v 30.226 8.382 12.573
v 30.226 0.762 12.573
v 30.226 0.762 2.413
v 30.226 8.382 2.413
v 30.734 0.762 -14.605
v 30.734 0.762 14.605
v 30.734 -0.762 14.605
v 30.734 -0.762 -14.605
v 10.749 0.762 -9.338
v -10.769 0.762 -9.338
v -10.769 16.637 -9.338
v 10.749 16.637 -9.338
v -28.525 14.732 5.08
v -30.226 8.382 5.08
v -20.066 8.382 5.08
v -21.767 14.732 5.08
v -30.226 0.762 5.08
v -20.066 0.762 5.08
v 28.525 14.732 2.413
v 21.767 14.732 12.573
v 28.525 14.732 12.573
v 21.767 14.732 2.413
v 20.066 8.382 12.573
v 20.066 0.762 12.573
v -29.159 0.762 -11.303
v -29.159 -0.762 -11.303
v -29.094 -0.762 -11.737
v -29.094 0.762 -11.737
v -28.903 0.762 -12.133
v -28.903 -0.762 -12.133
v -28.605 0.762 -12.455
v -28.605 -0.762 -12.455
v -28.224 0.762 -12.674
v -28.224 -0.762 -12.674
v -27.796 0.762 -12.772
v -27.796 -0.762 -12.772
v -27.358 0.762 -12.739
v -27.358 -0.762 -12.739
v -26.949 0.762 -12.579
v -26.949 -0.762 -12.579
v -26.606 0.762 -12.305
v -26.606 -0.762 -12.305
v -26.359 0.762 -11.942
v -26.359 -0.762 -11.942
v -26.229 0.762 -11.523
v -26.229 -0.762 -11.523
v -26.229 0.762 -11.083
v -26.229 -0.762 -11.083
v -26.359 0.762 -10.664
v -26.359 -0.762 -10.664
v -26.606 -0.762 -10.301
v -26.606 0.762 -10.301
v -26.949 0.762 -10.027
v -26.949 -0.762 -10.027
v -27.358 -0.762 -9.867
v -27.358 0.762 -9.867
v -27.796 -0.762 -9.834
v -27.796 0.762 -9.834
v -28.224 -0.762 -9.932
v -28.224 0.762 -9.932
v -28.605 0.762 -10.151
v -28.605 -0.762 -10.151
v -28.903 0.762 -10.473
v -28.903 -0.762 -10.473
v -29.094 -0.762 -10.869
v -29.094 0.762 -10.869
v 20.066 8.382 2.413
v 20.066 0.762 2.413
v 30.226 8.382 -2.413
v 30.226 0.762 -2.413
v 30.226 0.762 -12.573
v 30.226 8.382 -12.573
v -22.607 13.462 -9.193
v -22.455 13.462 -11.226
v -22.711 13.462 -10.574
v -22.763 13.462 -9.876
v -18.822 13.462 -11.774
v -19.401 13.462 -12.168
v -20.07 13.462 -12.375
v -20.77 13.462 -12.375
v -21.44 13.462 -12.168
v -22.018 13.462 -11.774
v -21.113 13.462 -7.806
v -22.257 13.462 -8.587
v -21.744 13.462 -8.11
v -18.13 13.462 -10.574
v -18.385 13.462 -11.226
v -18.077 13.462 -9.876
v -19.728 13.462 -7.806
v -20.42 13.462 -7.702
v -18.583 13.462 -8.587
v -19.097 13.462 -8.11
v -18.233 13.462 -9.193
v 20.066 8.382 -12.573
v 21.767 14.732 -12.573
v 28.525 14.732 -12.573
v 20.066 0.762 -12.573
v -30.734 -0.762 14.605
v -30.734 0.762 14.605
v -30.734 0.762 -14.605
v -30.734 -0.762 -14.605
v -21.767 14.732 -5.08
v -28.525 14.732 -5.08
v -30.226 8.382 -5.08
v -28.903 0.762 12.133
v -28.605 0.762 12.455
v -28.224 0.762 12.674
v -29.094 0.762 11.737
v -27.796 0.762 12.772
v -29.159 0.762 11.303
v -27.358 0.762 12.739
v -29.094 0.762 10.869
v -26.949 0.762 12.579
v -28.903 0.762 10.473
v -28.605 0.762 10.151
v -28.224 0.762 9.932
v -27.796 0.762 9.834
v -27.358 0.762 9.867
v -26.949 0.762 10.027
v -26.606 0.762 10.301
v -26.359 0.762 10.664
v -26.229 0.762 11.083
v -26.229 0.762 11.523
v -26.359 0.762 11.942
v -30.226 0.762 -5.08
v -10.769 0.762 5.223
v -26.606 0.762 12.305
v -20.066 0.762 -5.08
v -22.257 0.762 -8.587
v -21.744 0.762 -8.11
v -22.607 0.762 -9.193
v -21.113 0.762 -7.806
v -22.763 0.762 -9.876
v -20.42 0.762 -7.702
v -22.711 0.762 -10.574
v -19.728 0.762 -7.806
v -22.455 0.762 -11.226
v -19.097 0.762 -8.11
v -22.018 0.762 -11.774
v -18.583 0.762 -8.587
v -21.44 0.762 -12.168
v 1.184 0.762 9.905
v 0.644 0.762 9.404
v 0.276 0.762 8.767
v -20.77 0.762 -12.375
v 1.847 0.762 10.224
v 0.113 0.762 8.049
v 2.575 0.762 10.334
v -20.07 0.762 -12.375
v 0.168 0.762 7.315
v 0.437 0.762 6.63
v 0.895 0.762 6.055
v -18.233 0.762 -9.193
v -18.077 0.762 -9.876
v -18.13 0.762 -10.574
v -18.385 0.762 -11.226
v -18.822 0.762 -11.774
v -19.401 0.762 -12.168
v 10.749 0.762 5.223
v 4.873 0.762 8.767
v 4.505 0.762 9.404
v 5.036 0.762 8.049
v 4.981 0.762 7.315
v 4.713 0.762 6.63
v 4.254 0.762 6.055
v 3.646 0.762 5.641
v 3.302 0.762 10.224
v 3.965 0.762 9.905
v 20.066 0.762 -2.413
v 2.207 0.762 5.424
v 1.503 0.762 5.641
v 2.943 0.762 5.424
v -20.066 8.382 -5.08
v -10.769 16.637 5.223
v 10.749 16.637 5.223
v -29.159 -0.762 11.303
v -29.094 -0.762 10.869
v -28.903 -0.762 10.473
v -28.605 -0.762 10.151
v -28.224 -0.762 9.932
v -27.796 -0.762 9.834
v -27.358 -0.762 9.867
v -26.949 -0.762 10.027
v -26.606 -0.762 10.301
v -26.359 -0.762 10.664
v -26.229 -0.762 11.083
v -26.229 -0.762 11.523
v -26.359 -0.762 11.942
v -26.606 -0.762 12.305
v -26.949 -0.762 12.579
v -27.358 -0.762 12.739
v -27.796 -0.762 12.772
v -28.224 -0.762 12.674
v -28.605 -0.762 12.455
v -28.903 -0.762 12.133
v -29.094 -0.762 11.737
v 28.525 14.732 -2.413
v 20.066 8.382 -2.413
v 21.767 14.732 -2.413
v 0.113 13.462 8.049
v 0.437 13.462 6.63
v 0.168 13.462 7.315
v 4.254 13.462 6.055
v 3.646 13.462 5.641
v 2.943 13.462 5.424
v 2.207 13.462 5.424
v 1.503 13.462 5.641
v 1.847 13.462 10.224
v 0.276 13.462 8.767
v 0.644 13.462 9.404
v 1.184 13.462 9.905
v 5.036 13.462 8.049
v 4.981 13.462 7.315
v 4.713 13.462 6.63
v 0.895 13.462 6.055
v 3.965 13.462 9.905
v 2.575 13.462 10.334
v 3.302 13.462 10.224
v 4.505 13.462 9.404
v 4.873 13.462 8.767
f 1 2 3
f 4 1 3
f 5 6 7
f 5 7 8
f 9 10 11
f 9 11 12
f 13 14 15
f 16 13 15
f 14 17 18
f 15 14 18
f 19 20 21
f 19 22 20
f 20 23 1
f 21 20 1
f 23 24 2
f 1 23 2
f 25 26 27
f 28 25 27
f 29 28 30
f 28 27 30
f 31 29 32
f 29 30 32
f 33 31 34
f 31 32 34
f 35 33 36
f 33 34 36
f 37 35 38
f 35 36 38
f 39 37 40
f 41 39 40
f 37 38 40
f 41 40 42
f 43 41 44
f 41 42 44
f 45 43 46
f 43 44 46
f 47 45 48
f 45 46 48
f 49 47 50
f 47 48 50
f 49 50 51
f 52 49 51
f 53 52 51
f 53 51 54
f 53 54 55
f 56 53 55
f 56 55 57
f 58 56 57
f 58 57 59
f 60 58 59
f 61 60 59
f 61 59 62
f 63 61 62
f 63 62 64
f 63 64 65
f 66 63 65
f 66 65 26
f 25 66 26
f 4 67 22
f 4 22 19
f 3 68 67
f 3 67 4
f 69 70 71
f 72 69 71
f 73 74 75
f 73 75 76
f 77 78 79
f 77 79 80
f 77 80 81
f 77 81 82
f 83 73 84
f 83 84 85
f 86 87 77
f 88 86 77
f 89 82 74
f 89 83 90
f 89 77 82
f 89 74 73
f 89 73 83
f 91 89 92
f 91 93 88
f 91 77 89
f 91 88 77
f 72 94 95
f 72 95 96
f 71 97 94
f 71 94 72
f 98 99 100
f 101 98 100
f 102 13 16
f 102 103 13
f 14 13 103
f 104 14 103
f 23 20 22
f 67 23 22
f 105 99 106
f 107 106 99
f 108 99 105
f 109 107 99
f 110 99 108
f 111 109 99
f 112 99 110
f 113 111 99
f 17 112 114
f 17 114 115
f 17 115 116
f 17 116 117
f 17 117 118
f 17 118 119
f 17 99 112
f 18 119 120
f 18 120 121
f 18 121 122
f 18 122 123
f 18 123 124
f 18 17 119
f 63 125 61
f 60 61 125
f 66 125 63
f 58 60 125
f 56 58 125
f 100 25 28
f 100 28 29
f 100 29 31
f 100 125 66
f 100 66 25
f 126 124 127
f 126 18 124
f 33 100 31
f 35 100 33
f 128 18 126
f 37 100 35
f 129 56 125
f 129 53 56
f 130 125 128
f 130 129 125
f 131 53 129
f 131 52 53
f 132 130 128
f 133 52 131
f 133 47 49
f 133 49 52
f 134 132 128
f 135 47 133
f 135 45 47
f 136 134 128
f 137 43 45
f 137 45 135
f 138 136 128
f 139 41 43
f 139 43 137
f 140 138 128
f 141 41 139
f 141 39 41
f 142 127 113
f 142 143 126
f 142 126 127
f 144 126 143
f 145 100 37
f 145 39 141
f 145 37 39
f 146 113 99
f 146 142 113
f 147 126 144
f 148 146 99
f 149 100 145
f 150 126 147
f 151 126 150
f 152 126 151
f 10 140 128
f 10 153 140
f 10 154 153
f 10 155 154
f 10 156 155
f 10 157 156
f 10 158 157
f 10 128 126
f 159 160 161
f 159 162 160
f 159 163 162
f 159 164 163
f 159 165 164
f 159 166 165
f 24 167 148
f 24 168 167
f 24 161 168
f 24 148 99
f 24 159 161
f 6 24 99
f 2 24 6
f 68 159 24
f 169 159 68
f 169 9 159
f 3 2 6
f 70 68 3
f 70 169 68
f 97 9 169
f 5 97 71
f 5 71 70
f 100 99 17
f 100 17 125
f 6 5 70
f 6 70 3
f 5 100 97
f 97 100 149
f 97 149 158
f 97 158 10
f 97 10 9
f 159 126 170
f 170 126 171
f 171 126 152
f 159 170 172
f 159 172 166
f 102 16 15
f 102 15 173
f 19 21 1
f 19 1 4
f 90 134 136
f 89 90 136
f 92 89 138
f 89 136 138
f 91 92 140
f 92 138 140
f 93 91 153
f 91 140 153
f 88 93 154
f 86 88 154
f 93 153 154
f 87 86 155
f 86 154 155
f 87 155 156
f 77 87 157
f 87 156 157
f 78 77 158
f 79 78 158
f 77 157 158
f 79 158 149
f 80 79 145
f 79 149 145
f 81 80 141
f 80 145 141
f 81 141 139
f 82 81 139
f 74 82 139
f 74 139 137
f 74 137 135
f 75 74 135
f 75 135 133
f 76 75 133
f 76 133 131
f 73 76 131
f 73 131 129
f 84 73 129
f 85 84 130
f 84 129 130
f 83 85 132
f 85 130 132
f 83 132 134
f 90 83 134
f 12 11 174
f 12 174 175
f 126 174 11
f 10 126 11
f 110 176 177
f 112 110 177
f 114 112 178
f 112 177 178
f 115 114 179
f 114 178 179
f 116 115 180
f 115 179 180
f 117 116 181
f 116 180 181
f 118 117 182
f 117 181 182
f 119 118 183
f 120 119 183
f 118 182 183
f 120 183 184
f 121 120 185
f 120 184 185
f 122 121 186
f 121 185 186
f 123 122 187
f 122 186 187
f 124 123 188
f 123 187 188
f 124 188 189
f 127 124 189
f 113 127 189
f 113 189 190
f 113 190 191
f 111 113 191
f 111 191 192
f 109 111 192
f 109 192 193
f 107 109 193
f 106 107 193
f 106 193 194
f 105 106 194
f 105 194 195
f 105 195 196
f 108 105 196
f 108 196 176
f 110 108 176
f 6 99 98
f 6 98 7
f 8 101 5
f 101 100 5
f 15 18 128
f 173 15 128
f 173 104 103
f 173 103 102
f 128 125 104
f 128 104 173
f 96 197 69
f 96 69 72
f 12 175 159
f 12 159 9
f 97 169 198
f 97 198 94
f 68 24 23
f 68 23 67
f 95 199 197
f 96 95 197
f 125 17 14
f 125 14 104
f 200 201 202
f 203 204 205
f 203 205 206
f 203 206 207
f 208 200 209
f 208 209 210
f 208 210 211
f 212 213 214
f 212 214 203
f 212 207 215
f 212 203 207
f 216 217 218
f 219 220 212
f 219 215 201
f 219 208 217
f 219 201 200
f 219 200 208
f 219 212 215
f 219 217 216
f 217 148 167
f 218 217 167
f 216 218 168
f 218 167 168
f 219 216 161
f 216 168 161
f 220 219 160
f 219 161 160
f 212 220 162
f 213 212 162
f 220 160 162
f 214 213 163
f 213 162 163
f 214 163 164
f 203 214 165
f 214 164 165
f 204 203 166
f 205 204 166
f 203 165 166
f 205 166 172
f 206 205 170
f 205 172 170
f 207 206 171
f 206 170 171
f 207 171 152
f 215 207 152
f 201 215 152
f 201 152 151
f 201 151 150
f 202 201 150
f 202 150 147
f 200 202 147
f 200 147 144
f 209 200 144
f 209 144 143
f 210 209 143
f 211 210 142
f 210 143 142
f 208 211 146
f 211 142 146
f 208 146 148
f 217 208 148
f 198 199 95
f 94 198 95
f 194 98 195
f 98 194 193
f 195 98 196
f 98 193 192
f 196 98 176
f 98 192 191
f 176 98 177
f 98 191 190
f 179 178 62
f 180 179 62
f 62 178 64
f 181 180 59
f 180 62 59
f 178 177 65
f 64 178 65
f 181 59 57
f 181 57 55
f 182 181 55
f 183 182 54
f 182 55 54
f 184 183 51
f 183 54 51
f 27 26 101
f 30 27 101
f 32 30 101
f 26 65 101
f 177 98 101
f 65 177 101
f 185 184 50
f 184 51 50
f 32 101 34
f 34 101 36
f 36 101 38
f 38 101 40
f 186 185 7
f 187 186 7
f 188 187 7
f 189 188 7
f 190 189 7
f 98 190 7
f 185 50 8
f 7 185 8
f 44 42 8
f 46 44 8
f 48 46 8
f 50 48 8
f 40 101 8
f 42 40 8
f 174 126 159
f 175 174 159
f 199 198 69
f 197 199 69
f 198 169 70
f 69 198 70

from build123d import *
from OCP.BRepFilletAPI import BRepFilletAPI_MakeChamfer

# Parameters (mm, degrees)
SKETCH1_W                   = 61.468
SKETCH1_H                   = 29.21
BOSS_EXTRUDE1_DEPTH         = 0.762
F_32_0_116_DIAMETER_HOLE1_D = 2.9464
SKETCH4_W                   = 10.16
SKETCH4_H                   = 10.16
BOSS_EXTRUDE2_DEPTH         = 13.97
SKETCH5_W                   = 10.16
SKETCH5_H                   = 10.16
BOSS_EXTRUDE3_DEPTH         = 13.97
CHAMFER1_SIZE               = 6.35
CHAMFER1_SIZE2              = 1.701477372
SKETCH6_R                   = 2.3495
BOSS_EXTRUDE4_DEPTH         = 12.7
SKETCH7_W                   = 21.517957465
SKETCH7_H                   = 14.561058099
BOSS_EXTRUDE5_DEPTH         = 15.875
SKETCH8_R                   = 2.468766422
BOSS_EXTRUDE6_DEPTH         = 12.7


with BuildPart() as part:
    # Sketch1 → Boss-Extrude1 (new, symmetric)
    with BuildSketch(Plane(origin=(0, 0, 0), x_dir=(1, 0, 0), z_dir=(0, 1, 0))):
        Rectangle(SKETCH1_W, SKETCH1_H)
    extrude(amount=BOSS_EXTRUDE1_DEPTH, both=True)

    # #32 (0.116) Diameter Hole1 (through all)
    with Locations(Plane(origin=(0, 0.762, 0), x_dir=(1, 0, 0), z_dir=(0, 1, 0))):
        with Locations((-27.686, 11.303), (-27.686, -11.303)):
            Hole(F_32_0_116_DIAMETER_HOLE1_D / 2)

    # Sketch4 → Boss-Extrude2 (add)
    with BuildSketch(Plane(origin=(0, 0.762, 0), x_dir=(1, 0, 0), z_dir=(0, 1, 0))):
        with Locations((-25.146, 0)):
            Rectangle(SKETCH4_W, SKETCH4_H)
    extrude(amount=BOSS_EXTRUDE2_DEPTH)

    # Sketch5 → Boss-Extrude3 (add)
    with BuildSketch(Plane(origin=(0, 0.762, 0), x_dir=(1, 0, 0), z_dir=(0, 1, 0))):
        with Locations((25.146, 7.493)):
            Rectangle(SKETCH5_W, SKETCH5_H)
        with Locations((25.146, -7.493)):
            Rectangle(SKETCH5_W, SKETCH5_H)
    extrude(amount=BOSS_EXTRUDE3_DEPTH)

    # Chamfer1: one chamfer whose edges measure the first distance from different faces: ONE call of the kernel's chamfer builder (chamfer() names one face for all edges)
    chamfer1_edges_1 = [part.edges().sort_by_distance(p)[0] for p in [
        (-30.226, 14.732, 0),
    ]]
    chamfer1_side_1 = [part.faces().sort_by_distance(p)[0] for p in [
        (-30.226, 7.747, 0),
    ]]
    chamfer1_edges_2 = [part.edges().sort_by_distance(p)[0] for p in [
        (-20.066, 14.732, 0),
    ]]
    chamfer1_side_2 = [part.faces().sort_by_distance(p)[0] for p in [
        (-20.066, 7.747, 0),
    ]]
    chamfer1_edges_3 = [part.edges().sort_by_distance(p)[0] for p in [
        (20.066, 14.732, -7.493),
    ]]
    chamfer1_side_3 = [part.faces().sort_by_distance(p)[0] for p in [
        (20.066, 7.747, -7.493),
    ]]
    chamfer1_edges_4 = [part.edges().sort_by_distance(p)[0] for p in [
        (30.226, 14.732, -7.493),
    ]]
    chamfer1_side_4 = [part.faces().sort_by_distance(p)[0] for p in [
        (30.226, 7.747, -7.493),
    ]]
    chamfer1_edges_5 = [part.edges().sort_by_distance(p)[0] for p in [
        (20.066, 14.732, 7.493),
    ]]
    chamfer1_side_5 = [part.faces().sort_by_distance(p)[0] for p in [
        (20.066, 7.747, 7.493),
    ]]
    chamfer1_edges_6 = [part.edges().sort_by_distance(p)[0] for p in [
        (30.226, 14.732, 7.493),
    ]]
    chamfer1_side_6 = [part.faces().sort_by_distance(p)[0] for p in [
        (30.226, 7.747, 7.493),
    ]]
    chamfer1 = BRepFilletAPI_MakeChamfer(part.part.solid().wrapped)
    for e in chamfer1_edges_1:
        chamfer1.Add(CHAMFER1_SIZE, CHAMFER1_SIZE2, e.wrapped, chamfer1_side_1[0].wrapped)  # the first distance lies on this face
    for e in chamfer1_edges_2:
        chamfer1.Add(CHAMFER1_SIZE, CHAMFER1_SIZE2, e.wrapped, chamfer1_side_2[0].wrapped)  # the first distance lies on this face
    for e in chamfer1_edges_3:
        chamfer1.Add(CHAMFER1_SIZE, CHAMFER1_SIZE2, e.wrapped, chamfer1_side_3[0].wrapped)  # the first distance lies on this face
    for e in chamfer1_edges_4:
        chamfer1.Add(CHAMFER1_SIZE, CHAMFER1_SIZE2, e.wrapped, chamfer1_side_4[0].wrapped)  # the first distance lies on this face
    for e in chamfer1_edges_5:
        chamfer1.Add(CHAMFER1_SIZE, CHAMFER1_SIZE2, e.wrapped, chamfer1_side_5[0].wrapped)  # the first distance lies on this face
    for e in chamfer1_edges_6:
        chamfer1.Add(CHAMFER1_SIZE, CHAMFER1_SIZE2, e.wrapped, chamfer1_side_6[0].wrapped)  # the first distance lies on this face
    add(Compound.cast(chamfer1.Shape()), mode=Mode.REPLACE)

    # Sketch6 → Boss-Extrude4 (add)
    with BuildSketch(Plane(origin=(0, 0.762, 0), x_dir=(1, 0, 0), z_dir=(0, 1, 0))):
        with Locations(Location((-20.420225117, 10.051406146, 0), (0, 0, 270))):
            Circle(SKETCH6_R)
    extrude(amount=BOSS_EXTRUDE4_DEPTH)

    # Sketch7 → Boss-Extrude5 (add)
    with BuildSketch(Plane(origin=(0, 0.762, 0), x_dir=(1, 0, 0), z_dir=(0, 1, 0))):
        with Locations((-0.009722788, 2.057247528)):
            Rectangle(SKETCH7_W, SKETCH7_H)
    extrude(amount=BOSS_EXTRUDE5_DEPTH)

    # Sketch8 → Boss-Extrude6 (add)
    with BuildSketch(Plane(origin=(0, 0.762, 0), x_dir=(1, 0, 0), z_dir=(0, 1, 0))):
        with Locations(Location((2.574570697, -7.864784458, 0), (0, 0, 270))):
            Circle(SKETCH8_R)
    extrude(amount=BOSS_EXTRUDE6_DEPTH)


solid = part.part
